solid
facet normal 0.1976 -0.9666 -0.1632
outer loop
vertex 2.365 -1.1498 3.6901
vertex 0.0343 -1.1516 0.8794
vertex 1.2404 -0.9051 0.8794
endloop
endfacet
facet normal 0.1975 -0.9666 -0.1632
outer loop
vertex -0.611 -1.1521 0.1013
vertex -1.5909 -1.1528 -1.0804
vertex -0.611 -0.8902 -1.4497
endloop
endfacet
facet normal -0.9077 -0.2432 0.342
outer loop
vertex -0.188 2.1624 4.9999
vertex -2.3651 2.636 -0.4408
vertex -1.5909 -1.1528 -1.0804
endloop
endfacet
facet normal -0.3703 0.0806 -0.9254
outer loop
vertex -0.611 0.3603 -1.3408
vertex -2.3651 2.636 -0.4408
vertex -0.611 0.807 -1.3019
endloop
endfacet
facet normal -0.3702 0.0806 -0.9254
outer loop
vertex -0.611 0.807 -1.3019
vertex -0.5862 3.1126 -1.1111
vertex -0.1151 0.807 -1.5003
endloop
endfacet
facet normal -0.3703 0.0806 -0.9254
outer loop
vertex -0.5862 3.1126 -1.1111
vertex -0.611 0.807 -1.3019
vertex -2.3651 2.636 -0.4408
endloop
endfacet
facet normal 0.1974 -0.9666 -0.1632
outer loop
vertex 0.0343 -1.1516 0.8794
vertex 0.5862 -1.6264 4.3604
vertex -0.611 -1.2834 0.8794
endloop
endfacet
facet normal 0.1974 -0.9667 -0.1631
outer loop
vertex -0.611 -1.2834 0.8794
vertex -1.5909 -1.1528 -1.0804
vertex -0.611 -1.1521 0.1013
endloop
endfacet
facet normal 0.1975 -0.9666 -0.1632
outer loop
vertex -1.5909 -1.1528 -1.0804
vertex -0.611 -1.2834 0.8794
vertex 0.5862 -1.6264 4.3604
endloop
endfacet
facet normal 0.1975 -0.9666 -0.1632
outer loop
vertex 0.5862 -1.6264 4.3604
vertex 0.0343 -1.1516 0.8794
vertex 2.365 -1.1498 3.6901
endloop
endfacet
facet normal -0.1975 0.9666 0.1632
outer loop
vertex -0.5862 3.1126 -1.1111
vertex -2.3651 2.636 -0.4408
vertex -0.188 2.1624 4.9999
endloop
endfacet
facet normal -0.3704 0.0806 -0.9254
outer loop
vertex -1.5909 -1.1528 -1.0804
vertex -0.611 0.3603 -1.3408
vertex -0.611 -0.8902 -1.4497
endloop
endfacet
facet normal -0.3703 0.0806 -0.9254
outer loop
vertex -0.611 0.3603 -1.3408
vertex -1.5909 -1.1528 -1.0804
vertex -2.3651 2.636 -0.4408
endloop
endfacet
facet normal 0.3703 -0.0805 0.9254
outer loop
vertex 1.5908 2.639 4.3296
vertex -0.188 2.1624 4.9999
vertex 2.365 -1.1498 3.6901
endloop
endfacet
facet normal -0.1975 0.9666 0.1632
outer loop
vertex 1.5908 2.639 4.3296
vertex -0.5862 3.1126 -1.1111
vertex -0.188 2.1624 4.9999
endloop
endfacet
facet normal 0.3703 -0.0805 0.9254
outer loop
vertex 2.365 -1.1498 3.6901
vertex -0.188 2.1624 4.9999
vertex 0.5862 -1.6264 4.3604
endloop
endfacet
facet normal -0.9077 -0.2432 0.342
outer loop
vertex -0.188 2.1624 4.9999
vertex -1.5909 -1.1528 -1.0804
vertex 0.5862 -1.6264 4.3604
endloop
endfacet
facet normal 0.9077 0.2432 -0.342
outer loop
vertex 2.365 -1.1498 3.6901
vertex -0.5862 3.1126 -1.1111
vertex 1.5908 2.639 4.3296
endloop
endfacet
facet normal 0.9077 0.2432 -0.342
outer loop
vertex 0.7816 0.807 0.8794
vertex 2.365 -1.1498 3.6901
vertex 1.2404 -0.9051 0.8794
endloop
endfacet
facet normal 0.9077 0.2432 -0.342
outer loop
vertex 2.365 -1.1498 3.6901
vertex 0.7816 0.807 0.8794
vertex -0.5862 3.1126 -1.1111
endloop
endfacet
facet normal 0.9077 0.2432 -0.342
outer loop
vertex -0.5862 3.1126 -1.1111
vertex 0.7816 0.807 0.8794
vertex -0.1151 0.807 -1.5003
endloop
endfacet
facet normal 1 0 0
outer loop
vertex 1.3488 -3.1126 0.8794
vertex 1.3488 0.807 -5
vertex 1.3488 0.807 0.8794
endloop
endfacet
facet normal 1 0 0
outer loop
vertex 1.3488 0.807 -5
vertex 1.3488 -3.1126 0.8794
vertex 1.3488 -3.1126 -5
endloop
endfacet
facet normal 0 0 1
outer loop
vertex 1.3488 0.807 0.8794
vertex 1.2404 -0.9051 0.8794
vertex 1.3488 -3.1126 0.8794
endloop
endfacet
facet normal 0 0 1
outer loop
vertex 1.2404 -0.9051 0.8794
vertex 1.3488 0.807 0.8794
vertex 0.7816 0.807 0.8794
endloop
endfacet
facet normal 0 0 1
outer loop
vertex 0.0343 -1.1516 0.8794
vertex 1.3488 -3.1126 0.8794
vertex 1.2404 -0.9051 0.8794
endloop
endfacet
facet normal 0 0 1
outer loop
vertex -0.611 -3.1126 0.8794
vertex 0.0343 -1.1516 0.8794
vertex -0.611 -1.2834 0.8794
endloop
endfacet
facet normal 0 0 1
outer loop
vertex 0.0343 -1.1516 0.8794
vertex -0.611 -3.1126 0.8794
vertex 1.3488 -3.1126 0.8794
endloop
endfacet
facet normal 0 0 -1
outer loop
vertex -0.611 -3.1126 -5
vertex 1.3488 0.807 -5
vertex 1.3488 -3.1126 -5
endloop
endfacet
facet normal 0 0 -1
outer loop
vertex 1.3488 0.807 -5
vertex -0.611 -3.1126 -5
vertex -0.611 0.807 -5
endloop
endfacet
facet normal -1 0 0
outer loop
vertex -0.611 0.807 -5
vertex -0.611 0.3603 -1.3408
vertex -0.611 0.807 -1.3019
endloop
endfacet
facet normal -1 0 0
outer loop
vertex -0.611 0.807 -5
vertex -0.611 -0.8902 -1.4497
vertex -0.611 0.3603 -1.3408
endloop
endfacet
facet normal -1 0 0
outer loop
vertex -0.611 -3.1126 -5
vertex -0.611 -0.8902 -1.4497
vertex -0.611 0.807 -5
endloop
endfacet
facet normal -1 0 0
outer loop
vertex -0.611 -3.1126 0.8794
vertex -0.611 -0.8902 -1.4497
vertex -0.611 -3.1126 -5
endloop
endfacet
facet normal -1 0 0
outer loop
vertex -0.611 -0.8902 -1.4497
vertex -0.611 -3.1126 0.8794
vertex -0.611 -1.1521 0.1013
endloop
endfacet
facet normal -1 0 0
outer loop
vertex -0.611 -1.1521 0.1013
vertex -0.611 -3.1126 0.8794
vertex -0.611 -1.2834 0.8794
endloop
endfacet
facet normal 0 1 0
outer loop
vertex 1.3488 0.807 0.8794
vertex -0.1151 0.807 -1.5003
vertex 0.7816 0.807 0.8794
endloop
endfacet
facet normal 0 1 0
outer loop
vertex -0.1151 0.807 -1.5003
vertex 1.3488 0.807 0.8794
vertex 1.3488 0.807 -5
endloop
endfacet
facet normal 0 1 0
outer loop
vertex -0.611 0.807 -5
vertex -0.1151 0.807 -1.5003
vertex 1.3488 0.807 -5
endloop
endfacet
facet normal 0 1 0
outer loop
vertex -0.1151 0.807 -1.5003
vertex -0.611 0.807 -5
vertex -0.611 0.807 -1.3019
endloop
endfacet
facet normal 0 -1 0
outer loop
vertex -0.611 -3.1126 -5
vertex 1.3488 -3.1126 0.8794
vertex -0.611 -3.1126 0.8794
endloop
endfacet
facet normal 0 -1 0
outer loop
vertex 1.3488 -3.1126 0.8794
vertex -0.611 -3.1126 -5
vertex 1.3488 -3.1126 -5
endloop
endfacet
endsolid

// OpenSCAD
intersection() {
translate([-2.838061, -3.735107, -6.000000])
cube(size = [5.676132, 7.470204, 12.000000], center = false);
union() {
// Begin.
union() {
rotate([100, 20.0001, 15])
translate([-0.374936, 1.44358, -0.983411])
cube(size = [1.9598, 5.87927, 3.91963], center = true);

rotate([0, -0, 0])
translate([0.36893, -1.15281, -2.06032])
cube(size = [1.95978, 3.91957, 5.87935], center = true);
}
// End.
}
}
